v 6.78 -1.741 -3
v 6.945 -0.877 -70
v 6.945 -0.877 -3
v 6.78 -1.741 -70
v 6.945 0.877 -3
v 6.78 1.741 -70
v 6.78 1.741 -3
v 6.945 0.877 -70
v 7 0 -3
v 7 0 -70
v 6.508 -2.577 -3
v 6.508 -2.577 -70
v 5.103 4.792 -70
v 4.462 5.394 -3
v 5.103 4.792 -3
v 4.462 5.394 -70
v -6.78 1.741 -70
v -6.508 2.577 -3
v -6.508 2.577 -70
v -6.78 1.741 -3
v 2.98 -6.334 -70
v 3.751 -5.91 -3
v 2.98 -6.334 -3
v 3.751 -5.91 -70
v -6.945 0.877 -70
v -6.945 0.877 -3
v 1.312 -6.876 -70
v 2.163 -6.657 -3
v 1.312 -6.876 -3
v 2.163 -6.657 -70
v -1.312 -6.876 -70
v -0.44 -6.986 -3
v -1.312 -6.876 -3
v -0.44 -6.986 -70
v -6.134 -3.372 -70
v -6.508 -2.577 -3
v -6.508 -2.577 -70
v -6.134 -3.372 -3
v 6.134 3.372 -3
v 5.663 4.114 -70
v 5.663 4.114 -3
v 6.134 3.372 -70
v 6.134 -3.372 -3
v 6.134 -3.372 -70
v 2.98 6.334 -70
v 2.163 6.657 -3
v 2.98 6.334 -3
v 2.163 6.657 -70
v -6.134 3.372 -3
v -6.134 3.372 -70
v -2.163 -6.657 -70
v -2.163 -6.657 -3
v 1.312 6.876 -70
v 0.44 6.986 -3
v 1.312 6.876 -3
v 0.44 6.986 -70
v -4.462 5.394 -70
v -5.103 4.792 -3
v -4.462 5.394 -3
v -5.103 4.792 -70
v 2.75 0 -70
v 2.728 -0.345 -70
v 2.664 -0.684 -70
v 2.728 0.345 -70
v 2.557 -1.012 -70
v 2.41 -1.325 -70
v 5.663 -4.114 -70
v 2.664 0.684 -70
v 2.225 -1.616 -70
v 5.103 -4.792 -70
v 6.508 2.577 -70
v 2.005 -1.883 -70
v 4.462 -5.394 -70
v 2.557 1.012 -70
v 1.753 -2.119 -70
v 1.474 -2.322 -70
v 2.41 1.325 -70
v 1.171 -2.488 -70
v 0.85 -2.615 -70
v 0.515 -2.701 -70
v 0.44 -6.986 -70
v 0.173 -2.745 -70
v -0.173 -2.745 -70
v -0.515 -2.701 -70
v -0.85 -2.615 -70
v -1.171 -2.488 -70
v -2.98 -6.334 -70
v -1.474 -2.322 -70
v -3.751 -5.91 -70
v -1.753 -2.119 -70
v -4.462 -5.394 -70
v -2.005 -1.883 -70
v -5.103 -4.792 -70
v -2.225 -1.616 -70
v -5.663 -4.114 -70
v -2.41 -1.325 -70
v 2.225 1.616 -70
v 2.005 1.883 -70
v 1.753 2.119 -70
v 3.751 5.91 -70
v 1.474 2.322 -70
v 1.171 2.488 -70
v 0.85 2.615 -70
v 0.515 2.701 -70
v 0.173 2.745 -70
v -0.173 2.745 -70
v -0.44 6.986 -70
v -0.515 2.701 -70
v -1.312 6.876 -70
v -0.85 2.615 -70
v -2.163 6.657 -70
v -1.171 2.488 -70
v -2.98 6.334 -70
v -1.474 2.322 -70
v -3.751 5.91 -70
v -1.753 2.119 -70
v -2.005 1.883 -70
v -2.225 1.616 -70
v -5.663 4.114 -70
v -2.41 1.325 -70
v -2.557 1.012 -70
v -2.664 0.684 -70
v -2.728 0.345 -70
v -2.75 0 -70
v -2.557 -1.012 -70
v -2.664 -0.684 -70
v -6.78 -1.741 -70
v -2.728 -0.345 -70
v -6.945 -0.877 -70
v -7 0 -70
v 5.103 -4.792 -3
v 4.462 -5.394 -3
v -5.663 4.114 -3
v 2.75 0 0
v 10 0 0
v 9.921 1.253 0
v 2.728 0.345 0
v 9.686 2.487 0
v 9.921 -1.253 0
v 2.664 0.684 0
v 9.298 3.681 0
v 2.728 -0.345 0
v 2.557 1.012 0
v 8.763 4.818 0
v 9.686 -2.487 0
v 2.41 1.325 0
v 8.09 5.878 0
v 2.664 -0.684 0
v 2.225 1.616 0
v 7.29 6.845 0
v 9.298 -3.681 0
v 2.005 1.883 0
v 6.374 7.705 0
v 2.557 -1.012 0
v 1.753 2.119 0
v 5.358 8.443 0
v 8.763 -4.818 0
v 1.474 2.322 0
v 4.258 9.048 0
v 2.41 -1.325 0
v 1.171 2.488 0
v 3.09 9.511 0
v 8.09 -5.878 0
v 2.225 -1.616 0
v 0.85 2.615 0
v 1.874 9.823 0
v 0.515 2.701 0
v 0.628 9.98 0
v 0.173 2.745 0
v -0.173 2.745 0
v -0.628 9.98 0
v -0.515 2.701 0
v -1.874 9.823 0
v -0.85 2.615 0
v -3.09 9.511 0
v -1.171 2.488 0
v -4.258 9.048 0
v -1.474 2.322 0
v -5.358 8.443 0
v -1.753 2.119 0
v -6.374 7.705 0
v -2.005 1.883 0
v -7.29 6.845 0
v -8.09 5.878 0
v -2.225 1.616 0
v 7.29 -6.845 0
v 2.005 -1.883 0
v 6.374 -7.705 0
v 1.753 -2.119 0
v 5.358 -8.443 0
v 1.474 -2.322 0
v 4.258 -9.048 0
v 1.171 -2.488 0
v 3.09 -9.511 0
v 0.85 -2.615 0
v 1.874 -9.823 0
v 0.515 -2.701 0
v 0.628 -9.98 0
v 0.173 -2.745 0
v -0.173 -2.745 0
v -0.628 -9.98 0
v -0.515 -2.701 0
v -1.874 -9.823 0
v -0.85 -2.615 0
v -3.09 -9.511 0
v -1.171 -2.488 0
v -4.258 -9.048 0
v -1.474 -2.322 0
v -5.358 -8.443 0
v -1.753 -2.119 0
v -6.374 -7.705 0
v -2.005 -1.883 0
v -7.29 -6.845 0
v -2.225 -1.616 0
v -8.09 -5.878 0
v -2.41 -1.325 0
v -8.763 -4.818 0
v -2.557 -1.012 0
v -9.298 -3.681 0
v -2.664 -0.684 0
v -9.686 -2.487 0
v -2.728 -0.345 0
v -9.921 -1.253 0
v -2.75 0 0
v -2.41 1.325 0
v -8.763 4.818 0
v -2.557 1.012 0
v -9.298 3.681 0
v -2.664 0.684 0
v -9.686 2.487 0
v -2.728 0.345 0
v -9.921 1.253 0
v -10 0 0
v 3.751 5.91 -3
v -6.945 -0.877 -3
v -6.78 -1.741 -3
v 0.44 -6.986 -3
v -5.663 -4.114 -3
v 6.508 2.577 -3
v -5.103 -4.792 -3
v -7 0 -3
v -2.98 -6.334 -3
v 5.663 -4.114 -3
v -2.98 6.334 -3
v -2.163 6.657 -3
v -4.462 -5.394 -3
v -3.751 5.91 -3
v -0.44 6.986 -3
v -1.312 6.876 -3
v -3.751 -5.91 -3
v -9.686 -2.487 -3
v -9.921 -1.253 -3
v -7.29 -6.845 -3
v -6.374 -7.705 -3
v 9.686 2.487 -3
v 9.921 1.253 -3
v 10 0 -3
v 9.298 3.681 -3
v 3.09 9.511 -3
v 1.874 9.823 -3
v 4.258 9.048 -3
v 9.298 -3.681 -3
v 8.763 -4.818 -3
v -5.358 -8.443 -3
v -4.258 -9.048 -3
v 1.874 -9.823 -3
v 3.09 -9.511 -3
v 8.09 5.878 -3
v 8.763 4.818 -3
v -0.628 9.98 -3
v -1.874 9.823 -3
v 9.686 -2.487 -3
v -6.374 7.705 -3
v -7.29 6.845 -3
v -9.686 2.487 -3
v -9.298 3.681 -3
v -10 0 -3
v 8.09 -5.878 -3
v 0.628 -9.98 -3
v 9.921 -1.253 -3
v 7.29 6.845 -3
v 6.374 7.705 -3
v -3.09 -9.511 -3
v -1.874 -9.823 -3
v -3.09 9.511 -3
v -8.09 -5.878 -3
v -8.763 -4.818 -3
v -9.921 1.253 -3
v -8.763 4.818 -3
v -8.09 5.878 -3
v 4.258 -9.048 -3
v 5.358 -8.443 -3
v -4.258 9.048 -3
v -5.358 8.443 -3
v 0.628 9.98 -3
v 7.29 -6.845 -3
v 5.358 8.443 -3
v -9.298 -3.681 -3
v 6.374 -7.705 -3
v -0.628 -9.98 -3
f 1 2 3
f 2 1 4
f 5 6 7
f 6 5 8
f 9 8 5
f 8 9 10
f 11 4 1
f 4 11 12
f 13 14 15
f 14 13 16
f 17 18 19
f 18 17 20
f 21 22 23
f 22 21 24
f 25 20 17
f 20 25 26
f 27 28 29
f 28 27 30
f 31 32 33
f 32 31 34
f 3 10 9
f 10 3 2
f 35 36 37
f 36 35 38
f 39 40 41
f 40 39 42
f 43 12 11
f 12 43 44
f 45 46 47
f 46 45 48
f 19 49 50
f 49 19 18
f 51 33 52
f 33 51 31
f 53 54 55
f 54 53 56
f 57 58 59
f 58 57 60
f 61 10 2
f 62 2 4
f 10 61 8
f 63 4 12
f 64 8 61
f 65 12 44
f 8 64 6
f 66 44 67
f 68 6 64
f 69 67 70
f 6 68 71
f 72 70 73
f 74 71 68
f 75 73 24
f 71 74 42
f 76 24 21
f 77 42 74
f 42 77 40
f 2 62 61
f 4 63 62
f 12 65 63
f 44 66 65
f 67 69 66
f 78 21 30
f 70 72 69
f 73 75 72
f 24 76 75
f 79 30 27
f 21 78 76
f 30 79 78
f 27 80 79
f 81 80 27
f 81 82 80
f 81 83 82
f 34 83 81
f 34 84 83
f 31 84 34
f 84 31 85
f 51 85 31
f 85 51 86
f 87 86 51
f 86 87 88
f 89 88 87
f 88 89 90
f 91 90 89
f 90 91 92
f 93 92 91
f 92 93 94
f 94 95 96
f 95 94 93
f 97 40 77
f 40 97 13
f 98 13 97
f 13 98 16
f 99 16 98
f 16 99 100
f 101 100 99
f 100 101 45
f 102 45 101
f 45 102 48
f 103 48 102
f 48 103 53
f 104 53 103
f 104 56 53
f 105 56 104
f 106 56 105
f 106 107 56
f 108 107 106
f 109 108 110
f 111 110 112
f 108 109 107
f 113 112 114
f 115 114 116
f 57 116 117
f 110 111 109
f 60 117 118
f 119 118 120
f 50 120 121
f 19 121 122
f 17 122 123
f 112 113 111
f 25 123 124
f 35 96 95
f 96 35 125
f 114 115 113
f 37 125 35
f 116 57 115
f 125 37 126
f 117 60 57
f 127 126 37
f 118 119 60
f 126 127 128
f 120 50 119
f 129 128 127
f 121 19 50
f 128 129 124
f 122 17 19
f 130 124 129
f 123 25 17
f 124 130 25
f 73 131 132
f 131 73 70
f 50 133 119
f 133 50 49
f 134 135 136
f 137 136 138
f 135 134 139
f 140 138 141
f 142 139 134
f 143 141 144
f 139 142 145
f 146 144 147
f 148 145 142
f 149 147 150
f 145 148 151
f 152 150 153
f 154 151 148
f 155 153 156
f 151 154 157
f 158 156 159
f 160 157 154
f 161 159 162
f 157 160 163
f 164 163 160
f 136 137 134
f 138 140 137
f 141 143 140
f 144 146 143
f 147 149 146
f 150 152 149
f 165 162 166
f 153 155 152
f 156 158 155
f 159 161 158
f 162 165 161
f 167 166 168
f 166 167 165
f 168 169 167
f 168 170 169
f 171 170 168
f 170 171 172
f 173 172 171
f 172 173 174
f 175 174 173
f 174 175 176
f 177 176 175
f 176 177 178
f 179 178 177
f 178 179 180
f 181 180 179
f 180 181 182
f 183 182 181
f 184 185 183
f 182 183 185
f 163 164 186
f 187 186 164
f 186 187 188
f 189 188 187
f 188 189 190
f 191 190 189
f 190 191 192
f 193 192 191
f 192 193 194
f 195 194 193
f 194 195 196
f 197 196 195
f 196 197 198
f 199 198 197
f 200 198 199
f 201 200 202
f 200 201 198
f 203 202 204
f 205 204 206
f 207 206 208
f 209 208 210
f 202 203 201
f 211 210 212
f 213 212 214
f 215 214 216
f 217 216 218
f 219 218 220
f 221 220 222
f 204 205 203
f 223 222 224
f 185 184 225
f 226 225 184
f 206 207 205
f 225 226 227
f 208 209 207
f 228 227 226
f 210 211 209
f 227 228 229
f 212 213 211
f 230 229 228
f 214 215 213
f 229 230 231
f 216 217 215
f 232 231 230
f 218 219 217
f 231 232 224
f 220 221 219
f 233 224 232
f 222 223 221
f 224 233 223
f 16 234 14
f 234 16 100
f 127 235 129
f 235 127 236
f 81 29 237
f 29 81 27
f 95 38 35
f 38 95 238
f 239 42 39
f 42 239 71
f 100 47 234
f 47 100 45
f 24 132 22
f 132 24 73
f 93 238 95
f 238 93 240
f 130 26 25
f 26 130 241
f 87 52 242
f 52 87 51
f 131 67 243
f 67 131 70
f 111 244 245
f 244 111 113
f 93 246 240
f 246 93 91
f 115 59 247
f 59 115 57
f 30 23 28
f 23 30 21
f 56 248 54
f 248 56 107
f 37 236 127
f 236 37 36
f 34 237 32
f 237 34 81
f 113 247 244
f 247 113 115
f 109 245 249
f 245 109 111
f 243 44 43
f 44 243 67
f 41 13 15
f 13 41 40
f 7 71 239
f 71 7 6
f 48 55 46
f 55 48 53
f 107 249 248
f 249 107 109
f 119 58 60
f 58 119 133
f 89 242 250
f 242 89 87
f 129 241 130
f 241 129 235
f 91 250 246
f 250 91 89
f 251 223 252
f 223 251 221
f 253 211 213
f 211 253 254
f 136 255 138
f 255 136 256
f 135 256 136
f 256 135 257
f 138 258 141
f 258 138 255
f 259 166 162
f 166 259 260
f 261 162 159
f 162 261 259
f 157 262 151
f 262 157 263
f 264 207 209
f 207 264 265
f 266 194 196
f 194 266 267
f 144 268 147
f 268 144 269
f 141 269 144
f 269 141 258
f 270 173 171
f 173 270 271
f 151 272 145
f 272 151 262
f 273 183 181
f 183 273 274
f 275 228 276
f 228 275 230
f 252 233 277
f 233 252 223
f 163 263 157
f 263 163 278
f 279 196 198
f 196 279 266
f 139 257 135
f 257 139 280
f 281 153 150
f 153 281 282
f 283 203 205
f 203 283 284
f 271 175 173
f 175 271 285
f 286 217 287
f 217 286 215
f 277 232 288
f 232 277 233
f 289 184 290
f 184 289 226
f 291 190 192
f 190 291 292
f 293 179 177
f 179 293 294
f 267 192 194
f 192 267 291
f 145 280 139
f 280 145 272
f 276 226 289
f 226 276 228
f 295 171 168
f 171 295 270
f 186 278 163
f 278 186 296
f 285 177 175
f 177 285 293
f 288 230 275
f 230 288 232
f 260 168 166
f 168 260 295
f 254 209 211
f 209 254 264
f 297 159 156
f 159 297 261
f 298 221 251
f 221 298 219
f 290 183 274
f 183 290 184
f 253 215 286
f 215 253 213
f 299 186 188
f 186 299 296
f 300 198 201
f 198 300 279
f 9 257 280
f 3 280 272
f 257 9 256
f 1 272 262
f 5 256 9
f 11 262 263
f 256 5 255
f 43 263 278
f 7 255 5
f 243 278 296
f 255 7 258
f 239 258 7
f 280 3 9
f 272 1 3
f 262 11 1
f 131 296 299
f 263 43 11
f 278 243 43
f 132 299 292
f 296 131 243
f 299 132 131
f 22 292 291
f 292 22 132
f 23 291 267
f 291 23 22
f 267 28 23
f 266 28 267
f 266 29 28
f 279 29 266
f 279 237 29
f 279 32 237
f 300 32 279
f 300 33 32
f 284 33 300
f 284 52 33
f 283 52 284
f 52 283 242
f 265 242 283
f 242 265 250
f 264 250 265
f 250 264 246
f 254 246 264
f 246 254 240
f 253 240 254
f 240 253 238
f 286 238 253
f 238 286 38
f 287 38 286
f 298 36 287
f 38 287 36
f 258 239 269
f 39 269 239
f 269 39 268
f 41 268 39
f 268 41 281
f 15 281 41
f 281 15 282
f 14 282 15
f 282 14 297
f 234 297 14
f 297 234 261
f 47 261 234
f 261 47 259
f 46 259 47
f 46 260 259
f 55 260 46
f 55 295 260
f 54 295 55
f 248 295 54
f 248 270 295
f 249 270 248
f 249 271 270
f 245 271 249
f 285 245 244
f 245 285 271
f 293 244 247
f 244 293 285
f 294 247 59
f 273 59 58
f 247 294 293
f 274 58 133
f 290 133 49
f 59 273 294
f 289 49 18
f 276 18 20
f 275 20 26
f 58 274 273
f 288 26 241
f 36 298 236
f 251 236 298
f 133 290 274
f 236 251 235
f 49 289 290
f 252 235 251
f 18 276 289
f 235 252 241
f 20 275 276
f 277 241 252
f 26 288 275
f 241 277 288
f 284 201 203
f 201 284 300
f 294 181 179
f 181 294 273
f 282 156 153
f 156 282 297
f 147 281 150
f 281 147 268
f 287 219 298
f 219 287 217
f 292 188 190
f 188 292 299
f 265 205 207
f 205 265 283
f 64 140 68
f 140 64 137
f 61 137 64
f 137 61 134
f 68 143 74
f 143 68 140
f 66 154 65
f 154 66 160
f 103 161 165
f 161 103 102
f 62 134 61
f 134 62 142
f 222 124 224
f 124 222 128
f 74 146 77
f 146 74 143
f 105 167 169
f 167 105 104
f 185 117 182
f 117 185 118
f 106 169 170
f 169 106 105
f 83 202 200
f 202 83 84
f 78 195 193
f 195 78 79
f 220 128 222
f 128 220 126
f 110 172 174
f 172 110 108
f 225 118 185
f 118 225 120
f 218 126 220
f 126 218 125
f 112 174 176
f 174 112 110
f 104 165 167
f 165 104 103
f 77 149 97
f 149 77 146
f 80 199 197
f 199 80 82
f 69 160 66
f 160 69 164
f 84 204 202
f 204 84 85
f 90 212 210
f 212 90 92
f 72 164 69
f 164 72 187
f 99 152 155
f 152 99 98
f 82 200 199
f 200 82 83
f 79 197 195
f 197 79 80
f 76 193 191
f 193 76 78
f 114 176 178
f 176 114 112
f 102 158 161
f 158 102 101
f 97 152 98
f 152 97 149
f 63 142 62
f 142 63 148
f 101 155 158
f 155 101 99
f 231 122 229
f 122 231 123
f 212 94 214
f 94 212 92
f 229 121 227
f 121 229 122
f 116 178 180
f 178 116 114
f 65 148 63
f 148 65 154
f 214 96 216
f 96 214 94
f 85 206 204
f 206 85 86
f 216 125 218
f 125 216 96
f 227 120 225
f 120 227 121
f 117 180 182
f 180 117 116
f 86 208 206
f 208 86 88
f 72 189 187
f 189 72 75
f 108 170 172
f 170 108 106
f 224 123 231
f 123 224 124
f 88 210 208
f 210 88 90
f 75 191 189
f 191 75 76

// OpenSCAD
$fn = 50;


difference() {
	union() {
		translate(v = [0, 0, -70.0000000000]) {
			cylinder(h = 70, r = 7.0000000000);
		}
		translate(v = [0, 0, -3.0000000000]) {
			cylinder(h = 3, r = 10.0000000000);
		}
	}
	union() {
		#translate(v = [0, 0, -70]) {
			cylinder(h = 70, r = 2.7500000000);
		}
	}
}
